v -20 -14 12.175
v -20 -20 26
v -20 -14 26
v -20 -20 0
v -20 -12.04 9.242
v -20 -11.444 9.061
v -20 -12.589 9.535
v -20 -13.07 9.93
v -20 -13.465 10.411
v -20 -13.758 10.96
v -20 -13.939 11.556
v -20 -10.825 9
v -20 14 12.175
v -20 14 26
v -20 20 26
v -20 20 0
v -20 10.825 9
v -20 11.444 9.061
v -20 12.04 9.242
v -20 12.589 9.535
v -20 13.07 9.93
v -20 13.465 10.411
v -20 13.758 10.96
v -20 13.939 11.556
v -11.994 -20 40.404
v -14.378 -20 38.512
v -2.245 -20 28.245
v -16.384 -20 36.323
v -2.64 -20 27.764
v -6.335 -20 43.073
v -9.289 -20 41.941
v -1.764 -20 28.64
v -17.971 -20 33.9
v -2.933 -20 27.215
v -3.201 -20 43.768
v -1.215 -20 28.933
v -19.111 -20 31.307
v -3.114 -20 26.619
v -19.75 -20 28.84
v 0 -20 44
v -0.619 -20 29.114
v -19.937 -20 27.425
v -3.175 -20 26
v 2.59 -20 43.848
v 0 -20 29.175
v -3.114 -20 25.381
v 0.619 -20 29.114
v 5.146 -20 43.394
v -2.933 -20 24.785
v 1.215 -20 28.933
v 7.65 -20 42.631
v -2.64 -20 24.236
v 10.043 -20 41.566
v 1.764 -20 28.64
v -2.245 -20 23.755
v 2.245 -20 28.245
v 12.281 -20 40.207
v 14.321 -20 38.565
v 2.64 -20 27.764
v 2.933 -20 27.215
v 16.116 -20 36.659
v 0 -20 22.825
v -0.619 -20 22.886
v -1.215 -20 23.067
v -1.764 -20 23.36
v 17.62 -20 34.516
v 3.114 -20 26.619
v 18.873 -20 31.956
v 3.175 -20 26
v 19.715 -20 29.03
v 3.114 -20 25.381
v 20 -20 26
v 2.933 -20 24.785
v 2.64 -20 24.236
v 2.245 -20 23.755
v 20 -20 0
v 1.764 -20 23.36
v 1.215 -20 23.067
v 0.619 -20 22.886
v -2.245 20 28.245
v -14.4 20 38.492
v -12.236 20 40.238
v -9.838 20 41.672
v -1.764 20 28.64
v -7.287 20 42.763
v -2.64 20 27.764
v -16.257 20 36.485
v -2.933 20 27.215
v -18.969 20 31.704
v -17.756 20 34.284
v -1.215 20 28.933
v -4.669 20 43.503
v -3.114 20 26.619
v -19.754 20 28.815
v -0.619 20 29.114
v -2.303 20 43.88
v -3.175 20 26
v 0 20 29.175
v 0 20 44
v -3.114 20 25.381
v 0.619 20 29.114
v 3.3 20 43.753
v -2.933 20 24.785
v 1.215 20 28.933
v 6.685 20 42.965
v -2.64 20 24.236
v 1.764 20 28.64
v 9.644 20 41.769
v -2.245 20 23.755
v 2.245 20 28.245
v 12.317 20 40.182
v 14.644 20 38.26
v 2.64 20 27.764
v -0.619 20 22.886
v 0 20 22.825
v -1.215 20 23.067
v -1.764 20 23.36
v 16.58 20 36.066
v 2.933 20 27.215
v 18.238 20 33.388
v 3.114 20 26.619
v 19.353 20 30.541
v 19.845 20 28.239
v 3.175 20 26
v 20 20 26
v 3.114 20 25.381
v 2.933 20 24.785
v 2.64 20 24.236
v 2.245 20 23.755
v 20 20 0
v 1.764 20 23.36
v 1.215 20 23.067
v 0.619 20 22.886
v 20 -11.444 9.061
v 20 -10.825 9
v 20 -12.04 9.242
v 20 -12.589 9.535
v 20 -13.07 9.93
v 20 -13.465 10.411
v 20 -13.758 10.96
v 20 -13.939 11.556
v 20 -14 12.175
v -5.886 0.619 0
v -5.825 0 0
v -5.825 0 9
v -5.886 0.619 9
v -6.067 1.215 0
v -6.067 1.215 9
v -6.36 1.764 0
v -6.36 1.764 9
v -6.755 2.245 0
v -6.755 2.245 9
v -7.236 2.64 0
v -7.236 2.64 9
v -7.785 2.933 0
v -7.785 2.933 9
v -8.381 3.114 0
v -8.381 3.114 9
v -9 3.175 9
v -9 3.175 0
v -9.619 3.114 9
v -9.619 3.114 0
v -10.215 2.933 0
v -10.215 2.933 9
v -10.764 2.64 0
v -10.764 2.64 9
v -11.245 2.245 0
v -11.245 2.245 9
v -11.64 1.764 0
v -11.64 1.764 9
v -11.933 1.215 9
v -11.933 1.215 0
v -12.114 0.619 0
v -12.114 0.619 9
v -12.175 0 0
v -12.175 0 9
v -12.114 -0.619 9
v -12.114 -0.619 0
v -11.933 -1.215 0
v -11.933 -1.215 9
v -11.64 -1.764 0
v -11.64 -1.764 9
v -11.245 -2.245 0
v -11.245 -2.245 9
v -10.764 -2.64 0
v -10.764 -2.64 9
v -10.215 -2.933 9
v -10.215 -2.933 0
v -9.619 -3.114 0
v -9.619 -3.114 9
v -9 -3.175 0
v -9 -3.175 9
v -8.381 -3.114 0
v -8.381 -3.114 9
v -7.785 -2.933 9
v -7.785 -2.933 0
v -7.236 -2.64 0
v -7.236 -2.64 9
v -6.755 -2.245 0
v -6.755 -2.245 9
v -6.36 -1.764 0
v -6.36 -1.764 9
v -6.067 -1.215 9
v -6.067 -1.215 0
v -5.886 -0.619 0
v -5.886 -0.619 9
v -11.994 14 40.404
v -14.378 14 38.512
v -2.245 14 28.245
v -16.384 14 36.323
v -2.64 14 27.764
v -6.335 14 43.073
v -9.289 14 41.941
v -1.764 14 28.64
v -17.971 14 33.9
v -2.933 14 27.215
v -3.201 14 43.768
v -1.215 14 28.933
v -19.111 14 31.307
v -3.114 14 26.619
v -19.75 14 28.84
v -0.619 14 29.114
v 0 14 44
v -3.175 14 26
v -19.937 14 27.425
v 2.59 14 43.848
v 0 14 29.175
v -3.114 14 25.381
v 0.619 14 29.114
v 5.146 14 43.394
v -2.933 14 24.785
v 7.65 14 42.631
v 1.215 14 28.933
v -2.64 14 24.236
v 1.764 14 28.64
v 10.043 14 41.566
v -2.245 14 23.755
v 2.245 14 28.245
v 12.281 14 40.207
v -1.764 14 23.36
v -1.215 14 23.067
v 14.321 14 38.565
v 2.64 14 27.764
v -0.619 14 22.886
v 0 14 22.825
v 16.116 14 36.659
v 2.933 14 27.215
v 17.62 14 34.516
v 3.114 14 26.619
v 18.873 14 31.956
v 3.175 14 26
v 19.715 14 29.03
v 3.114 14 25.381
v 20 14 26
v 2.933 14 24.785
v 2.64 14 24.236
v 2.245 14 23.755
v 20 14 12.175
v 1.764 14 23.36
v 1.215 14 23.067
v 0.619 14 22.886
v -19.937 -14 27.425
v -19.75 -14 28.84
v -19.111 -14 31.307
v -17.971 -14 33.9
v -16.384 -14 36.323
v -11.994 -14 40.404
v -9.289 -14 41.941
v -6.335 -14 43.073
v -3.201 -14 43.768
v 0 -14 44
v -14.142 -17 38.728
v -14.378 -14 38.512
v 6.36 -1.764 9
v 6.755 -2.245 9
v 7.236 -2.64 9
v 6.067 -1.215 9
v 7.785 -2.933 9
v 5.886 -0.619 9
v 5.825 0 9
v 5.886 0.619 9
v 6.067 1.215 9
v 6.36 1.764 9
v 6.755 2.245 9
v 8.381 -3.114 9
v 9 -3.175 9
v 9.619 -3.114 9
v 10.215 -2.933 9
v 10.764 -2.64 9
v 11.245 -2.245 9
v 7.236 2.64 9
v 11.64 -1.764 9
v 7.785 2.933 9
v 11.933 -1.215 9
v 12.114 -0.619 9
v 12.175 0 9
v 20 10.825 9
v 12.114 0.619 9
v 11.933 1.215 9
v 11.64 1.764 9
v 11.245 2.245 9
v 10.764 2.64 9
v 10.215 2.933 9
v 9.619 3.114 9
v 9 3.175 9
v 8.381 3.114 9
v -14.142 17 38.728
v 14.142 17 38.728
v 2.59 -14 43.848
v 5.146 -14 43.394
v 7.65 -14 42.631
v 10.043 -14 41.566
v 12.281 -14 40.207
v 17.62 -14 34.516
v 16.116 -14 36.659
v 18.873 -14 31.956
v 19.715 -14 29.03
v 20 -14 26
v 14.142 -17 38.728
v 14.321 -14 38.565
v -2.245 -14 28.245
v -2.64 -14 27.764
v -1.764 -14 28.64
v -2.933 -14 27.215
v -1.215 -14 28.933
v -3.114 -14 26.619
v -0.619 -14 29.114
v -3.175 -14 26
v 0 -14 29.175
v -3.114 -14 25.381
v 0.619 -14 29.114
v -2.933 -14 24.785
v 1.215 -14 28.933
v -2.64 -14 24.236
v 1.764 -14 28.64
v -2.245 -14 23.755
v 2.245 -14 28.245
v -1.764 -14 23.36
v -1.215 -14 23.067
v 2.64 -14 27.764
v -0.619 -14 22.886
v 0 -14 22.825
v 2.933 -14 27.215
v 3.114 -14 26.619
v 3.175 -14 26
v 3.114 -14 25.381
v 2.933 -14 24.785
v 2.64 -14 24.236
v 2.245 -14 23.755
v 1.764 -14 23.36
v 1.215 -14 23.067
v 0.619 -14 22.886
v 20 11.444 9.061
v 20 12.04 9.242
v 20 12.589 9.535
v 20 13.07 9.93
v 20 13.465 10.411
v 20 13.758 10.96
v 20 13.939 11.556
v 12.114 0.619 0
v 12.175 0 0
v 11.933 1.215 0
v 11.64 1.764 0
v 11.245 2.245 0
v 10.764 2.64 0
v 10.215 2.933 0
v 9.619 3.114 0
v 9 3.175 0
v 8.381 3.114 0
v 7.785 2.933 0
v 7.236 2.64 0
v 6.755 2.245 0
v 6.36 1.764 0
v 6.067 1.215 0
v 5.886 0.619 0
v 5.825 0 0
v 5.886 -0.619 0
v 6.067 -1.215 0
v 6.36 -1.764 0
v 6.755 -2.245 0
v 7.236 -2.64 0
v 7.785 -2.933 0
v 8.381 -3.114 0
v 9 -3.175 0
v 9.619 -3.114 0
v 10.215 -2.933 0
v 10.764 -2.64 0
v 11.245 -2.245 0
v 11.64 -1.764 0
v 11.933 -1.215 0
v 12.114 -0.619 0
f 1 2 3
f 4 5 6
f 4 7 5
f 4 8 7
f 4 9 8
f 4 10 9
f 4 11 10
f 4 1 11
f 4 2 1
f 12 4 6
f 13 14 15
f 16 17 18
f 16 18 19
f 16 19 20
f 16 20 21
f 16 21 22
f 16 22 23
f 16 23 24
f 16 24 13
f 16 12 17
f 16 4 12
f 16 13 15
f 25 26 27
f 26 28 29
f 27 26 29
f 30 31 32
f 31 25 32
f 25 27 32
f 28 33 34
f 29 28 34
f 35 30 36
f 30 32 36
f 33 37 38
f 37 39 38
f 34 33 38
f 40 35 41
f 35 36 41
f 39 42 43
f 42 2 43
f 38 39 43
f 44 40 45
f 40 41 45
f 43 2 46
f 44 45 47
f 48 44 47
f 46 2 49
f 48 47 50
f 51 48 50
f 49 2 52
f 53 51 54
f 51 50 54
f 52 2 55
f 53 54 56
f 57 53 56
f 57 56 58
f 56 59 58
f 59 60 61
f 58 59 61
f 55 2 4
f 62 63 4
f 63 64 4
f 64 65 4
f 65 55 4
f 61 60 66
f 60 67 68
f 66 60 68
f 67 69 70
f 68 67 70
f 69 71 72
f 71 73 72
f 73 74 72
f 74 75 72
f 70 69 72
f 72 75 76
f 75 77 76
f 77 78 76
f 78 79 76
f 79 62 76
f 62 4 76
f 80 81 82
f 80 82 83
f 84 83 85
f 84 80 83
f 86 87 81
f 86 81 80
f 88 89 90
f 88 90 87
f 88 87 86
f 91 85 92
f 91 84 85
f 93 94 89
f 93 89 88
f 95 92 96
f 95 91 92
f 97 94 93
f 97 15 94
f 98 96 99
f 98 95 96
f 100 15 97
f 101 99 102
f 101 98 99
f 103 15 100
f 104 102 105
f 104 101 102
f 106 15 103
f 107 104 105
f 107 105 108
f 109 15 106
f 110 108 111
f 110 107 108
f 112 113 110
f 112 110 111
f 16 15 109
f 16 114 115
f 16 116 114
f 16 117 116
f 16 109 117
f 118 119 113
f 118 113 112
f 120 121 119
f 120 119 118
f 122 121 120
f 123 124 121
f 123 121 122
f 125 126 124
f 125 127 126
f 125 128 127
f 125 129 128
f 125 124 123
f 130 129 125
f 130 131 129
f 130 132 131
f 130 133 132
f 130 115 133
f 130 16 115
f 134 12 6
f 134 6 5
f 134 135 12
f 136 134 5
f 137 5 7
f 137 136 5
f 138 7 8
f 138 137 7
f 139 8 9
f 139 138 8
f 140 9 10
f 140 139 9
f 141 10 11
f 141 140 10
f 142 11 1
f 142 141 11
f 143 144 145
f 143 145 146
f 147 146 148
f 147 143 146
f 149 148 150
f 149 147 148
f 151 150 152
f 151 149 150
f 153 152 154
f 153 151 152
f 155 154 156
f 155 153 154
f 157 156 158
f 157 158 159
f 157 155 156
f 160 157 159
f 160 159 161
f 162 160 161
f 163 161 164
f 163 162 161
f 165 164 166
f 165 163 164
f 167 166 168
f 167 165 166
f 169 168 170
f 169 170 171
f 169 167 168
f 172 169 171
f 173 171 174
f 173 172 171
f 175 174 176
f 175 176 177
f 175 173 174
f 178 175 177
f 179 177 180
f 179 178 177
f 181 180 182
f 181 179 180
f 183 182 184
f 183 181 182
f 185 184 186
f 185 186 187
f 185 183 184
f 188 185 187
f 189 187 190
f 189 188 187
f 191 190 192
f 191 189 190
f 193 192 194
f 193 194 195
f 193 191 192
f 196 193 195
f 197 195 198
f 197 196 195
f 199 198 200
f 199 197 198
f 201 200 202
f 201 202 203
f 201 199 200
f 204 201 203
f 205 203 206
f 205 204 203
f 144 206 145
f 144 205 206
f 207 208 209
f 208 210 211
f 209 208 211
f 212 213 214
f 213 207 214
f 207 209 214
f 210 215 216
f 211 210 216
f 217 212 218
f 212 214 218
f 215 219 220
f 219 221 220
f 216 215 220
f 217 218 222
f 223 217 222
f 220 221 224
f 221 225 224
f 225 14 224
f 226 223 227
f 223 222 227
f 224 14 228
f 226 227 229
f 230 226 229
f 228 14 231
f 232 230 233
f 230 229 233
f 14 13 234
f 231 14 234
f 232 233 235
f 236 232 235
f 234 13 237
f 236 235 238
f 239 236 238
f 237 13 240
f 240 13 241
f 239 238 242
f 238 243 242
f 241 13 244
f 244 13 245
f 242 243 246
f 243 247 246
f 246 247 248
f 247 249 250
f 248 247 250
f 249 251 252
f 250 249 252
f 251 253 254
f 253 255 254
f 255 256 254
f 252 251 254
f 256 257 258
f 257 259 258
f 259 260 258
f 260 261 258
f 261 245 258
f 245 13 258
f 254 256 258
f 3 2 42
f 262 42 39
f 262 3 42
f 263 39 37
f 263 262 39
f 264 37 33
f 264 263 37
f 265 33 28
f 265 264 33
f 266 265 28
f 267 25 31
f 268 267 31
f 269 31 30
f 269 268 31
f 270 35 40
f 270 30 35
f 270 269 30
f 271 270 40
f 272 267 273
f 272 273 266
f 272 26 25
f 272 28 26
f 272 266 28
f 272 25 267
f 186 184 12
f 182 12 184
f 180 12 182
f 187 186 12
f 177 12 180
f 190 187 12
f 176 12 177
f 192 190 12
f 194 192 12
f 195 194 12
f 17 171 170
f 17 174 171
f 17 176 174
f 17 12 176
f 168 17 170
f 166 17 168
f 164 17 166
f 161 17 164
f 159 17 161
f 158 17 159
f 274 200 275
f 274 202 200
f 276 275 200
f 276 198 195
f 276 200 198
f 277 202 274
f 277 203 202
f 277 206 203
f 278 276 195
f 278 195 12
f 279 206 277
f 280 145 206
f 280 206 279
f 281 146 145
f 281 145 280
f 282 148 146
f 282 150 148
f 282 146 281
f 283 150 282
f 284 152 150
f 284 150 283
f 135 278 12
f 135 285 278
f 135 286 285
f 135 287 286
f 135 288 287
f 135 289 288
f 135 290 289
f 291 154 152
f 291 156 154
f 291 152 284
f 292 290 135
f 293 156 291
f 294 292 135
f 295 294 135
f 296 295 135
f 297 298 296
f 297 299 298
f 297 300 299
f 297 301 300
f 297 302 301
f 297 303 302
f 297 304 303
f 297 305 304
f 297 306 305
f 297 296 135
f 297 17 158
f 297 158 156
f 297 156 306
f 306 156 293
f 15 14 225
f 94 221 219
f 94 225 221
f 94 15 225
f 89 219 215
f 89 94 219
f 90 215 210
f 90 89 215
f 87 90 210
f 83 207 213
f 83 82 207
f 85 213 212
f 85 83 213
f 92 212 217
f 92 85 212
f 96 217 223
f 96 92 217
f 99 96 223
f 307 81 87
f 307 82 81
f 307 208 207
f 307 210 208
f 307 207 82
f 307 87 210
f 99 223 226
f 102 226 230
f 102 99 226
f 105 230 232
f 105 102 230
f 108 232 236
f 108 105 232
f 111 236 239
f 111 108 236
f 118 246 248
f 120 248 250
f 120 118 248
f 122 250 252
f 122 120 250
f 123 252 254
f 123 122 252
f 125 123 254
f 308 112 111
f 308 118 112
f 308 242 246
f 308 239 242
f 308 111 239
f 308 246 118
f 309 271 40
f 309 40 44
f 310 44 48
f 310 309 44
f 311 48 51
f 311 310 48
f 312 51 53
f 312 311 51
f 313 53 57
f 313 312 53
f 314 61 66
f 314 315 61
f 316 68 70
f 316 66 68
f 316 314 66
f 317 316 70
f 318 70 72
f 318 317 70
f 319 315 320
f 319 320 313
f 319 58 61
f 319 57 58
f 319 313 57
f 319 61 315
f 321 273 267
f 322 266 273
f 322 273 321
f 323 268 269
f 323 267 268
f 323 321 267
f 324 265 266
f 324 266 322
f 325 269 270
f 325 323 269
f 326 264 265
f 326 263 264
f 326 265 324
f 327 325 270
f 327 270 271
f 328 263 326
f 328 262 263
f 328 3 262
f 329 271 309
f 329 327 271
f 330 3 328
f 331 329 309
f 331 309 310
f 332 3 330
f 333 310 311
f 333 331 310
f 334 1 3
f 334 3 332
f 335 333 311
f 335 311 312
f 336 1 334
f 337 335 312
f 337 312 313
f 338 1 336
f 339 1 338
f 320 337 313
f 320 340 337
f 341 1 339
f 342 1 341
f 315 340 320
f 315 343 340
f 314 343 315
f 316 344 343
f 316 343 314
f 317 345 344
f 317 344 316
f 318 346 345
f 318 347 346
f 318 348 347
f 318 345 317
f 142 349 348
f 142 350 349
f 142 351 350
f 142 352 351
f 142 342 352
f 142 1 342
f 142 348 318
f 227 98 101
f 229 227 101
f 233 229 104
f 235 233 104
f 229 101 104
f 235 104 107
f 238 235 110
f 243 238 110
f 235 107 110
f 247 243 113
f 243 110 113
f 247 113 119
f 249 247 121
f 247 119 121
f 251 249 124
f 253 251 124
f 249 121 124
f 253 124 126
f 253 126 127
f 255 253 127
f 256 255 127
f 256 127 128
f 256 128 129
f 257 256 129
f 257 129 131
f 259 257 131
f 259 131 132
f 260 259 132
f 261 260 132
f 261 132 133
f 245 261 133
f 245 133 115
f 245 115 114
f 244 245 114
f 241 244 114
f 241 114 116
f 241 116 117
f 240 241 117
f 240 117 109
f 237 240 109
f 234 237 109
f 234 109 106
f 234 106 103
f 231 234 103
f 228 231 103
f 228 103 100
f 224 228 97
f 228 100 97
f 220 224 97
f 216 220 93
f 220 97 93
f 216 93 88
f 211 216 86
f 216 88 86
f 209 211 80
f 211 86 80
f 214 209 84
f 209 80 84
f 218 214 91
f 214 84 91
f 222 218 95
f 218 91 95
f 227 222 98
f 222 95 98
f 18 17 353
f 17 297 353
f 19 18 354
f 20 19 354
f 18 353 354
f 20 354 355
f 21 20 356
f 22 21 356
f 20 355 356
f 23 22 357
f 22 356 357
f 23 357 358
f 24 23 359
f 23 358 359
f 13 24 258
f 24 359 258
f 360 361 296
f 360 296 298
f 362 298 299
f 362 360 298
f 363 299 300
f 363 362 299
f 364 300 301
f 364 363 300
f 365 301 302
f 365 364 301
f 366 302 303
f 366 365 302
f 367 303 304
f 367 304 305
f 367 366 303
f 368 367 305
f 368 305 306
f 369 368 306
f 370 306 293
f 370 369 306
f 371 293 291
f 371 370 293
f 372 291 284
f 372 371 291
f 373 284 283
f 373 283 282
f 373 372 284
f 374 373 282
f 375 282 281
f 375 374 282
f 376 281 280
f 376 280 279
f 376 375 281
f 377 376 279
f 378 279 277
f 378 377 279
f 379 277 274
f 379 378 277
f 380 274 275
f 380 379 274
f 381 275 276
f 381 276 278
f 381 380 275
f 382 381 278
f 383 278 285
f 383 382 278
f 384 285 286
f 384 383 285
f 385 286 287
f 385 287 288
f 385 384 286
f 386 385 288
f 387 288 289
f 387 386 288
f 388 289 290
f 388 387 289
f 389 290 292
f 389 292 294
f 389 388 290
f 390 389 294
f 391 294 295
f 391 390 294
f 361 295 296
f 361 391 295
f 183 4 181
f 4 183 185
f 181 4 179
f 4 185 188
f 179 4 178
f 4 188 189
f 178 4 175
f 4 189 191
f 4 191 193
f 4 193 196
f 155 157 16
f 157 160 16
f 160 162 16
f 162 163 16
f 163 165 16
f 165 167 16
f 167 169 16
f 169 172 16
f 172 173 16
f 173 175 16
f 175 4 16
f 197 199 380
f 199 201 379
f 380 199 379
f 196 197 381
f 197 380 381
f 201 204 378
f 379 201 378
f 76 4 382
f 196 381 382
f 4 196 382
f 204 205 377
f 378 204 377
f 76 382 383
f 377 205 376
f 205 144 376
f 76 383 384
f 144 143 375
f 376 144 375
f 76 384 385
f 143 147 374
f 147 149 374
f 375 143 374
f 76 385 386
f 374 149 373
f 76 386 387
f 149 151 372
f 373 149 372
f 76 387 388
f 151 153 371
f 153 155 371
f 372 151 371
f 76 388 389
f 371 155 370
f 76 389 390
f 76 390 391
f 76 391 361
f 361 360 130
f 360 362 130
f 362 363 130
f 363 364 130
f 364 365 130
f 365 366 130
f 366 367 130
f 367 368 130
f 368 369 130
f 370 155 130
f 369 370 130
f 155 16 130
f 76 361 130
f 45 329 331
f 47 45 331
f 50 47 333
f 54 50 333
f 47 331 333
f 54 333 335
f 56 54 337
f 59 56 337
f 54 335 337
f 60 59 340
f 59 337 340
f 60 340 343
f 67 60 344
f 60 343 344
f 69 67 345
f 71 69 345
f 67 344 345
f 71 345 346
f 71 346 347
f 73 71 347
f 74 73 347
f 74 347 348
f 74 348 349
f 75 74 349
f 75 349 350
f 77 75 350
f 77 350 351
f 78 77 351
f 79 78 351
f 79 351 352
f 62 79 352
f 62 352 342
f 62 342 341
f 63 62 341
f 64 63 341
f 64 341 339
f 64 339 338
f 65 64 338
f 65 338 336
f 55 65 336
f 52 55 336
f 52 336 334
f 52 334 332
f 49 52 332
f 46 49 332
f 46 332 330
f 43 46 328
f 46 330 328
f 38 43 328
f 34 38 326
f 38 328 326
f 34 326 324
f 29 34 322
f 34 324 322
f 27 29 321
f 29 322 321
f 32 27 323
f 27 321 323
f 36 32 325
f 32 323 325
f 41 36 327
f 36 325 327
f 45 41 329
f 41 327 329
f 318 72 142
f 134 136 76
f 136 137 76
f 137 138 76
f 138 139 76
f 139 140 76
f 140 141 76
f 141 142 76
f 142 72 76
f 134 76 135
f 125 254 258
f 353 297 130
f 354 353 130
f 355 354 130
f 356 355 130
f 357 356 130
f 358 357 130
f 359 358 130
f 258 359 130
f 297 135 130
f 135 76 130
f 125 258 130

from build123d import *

# Parameters (mm, degrees)
SKETCH1_W           = 40
SKETCH1_H           = 40
SKETCH1_R           = 3.175
BOSS_EXTRUDE1_DEPTH = 9
SKETCH2_W           = 40
SKETCH2_H           = 6
BOSS_EXTRUDE2_DEPTH = 35
FILLET1_R           = 3.175
SKETCH3_R           = 3.175
CUT_EXTRUDE1_DEPTH  = 63.737548565


with BuildPart() as part:
    # Sketch1 → Boss-Extrude1 (new body)
    with BuildSketch(Plane.XY):
        Rectangle(SKETCH1_W, SKETCH1_H)
        with Locations((9, 0)):
            Circle(SKETCH1_R, mode=Mode.SUBTRACT)
        with Locations((-9, 0)):
            Circle(SKETCH1_R, mode=Mode.SUBTRACT)
    extrude(amount=BOSS_EXTRUDE1_DEPTH)

    # Sketch2 → Boss-Extrude2 (add)
    with BuildSketch(Plane.XY.offset(9)):
        with Locations((0, 17)):
            Rectangle(SKETCH2_W, SKETCH2_H)
        with Locations((0, -17)):
            Rectangle(SKETCH2_W, SKETCH2_H)
    extrude(amount=BOSS_EXTRUDE2_DEPTH)

    # Fillet1
    fillet1_edges = [part.edges().sort_by_distance(p)[0] for p in [
        (0, -14, 9),
        (0, 14, 9),
    ]]
    fillet(fillet1_edges, radius=FILLET1_R)

    # Sketch3 → Cut-Extrude1 (cut, through all)
    with BuildSketch(Plane(origin=(0, 20, 0), x_dir=(1, 0, 0), z_dir=(0, 1, 0))):
        with BuildLine():
            Line((-20, -44), (1e-09, -44))
            add(Edge.make_bspline(
                [(-20, -26), (-20, -44), (0, -44)],
                knots=[3.141592654, 3.141592654, 3.141592654, 4.71238898, 4.71238898, 4.71238898], degree=2, weights=[1, 0.707106781, 1]))
            Line((-20, -26), (-20, -44))
        make_face()
        with BuildLine():
            Line((1e-09, -44), (20, -44))
            Line((20, -44), (20, -26))
            add(Edge.make_bspline(
                [(0, -44), (20, -44), (20, -26)],
                knots=[4.71238898, 4.71238898, 4.71238898, 6.283185307, 6.283185307, 6.283185307], degree=2, weights=[1, 0.707106781, 1]))
        make_face()
        with Locations(Location((0, -26, 0), (0, 0, 270))):
            Circle(SKETCH3_R)
    extrude(amount=-CUT_EXTRUDE1_DEPTH, mode=Mode.SUBTRACT)


solid = part.part
